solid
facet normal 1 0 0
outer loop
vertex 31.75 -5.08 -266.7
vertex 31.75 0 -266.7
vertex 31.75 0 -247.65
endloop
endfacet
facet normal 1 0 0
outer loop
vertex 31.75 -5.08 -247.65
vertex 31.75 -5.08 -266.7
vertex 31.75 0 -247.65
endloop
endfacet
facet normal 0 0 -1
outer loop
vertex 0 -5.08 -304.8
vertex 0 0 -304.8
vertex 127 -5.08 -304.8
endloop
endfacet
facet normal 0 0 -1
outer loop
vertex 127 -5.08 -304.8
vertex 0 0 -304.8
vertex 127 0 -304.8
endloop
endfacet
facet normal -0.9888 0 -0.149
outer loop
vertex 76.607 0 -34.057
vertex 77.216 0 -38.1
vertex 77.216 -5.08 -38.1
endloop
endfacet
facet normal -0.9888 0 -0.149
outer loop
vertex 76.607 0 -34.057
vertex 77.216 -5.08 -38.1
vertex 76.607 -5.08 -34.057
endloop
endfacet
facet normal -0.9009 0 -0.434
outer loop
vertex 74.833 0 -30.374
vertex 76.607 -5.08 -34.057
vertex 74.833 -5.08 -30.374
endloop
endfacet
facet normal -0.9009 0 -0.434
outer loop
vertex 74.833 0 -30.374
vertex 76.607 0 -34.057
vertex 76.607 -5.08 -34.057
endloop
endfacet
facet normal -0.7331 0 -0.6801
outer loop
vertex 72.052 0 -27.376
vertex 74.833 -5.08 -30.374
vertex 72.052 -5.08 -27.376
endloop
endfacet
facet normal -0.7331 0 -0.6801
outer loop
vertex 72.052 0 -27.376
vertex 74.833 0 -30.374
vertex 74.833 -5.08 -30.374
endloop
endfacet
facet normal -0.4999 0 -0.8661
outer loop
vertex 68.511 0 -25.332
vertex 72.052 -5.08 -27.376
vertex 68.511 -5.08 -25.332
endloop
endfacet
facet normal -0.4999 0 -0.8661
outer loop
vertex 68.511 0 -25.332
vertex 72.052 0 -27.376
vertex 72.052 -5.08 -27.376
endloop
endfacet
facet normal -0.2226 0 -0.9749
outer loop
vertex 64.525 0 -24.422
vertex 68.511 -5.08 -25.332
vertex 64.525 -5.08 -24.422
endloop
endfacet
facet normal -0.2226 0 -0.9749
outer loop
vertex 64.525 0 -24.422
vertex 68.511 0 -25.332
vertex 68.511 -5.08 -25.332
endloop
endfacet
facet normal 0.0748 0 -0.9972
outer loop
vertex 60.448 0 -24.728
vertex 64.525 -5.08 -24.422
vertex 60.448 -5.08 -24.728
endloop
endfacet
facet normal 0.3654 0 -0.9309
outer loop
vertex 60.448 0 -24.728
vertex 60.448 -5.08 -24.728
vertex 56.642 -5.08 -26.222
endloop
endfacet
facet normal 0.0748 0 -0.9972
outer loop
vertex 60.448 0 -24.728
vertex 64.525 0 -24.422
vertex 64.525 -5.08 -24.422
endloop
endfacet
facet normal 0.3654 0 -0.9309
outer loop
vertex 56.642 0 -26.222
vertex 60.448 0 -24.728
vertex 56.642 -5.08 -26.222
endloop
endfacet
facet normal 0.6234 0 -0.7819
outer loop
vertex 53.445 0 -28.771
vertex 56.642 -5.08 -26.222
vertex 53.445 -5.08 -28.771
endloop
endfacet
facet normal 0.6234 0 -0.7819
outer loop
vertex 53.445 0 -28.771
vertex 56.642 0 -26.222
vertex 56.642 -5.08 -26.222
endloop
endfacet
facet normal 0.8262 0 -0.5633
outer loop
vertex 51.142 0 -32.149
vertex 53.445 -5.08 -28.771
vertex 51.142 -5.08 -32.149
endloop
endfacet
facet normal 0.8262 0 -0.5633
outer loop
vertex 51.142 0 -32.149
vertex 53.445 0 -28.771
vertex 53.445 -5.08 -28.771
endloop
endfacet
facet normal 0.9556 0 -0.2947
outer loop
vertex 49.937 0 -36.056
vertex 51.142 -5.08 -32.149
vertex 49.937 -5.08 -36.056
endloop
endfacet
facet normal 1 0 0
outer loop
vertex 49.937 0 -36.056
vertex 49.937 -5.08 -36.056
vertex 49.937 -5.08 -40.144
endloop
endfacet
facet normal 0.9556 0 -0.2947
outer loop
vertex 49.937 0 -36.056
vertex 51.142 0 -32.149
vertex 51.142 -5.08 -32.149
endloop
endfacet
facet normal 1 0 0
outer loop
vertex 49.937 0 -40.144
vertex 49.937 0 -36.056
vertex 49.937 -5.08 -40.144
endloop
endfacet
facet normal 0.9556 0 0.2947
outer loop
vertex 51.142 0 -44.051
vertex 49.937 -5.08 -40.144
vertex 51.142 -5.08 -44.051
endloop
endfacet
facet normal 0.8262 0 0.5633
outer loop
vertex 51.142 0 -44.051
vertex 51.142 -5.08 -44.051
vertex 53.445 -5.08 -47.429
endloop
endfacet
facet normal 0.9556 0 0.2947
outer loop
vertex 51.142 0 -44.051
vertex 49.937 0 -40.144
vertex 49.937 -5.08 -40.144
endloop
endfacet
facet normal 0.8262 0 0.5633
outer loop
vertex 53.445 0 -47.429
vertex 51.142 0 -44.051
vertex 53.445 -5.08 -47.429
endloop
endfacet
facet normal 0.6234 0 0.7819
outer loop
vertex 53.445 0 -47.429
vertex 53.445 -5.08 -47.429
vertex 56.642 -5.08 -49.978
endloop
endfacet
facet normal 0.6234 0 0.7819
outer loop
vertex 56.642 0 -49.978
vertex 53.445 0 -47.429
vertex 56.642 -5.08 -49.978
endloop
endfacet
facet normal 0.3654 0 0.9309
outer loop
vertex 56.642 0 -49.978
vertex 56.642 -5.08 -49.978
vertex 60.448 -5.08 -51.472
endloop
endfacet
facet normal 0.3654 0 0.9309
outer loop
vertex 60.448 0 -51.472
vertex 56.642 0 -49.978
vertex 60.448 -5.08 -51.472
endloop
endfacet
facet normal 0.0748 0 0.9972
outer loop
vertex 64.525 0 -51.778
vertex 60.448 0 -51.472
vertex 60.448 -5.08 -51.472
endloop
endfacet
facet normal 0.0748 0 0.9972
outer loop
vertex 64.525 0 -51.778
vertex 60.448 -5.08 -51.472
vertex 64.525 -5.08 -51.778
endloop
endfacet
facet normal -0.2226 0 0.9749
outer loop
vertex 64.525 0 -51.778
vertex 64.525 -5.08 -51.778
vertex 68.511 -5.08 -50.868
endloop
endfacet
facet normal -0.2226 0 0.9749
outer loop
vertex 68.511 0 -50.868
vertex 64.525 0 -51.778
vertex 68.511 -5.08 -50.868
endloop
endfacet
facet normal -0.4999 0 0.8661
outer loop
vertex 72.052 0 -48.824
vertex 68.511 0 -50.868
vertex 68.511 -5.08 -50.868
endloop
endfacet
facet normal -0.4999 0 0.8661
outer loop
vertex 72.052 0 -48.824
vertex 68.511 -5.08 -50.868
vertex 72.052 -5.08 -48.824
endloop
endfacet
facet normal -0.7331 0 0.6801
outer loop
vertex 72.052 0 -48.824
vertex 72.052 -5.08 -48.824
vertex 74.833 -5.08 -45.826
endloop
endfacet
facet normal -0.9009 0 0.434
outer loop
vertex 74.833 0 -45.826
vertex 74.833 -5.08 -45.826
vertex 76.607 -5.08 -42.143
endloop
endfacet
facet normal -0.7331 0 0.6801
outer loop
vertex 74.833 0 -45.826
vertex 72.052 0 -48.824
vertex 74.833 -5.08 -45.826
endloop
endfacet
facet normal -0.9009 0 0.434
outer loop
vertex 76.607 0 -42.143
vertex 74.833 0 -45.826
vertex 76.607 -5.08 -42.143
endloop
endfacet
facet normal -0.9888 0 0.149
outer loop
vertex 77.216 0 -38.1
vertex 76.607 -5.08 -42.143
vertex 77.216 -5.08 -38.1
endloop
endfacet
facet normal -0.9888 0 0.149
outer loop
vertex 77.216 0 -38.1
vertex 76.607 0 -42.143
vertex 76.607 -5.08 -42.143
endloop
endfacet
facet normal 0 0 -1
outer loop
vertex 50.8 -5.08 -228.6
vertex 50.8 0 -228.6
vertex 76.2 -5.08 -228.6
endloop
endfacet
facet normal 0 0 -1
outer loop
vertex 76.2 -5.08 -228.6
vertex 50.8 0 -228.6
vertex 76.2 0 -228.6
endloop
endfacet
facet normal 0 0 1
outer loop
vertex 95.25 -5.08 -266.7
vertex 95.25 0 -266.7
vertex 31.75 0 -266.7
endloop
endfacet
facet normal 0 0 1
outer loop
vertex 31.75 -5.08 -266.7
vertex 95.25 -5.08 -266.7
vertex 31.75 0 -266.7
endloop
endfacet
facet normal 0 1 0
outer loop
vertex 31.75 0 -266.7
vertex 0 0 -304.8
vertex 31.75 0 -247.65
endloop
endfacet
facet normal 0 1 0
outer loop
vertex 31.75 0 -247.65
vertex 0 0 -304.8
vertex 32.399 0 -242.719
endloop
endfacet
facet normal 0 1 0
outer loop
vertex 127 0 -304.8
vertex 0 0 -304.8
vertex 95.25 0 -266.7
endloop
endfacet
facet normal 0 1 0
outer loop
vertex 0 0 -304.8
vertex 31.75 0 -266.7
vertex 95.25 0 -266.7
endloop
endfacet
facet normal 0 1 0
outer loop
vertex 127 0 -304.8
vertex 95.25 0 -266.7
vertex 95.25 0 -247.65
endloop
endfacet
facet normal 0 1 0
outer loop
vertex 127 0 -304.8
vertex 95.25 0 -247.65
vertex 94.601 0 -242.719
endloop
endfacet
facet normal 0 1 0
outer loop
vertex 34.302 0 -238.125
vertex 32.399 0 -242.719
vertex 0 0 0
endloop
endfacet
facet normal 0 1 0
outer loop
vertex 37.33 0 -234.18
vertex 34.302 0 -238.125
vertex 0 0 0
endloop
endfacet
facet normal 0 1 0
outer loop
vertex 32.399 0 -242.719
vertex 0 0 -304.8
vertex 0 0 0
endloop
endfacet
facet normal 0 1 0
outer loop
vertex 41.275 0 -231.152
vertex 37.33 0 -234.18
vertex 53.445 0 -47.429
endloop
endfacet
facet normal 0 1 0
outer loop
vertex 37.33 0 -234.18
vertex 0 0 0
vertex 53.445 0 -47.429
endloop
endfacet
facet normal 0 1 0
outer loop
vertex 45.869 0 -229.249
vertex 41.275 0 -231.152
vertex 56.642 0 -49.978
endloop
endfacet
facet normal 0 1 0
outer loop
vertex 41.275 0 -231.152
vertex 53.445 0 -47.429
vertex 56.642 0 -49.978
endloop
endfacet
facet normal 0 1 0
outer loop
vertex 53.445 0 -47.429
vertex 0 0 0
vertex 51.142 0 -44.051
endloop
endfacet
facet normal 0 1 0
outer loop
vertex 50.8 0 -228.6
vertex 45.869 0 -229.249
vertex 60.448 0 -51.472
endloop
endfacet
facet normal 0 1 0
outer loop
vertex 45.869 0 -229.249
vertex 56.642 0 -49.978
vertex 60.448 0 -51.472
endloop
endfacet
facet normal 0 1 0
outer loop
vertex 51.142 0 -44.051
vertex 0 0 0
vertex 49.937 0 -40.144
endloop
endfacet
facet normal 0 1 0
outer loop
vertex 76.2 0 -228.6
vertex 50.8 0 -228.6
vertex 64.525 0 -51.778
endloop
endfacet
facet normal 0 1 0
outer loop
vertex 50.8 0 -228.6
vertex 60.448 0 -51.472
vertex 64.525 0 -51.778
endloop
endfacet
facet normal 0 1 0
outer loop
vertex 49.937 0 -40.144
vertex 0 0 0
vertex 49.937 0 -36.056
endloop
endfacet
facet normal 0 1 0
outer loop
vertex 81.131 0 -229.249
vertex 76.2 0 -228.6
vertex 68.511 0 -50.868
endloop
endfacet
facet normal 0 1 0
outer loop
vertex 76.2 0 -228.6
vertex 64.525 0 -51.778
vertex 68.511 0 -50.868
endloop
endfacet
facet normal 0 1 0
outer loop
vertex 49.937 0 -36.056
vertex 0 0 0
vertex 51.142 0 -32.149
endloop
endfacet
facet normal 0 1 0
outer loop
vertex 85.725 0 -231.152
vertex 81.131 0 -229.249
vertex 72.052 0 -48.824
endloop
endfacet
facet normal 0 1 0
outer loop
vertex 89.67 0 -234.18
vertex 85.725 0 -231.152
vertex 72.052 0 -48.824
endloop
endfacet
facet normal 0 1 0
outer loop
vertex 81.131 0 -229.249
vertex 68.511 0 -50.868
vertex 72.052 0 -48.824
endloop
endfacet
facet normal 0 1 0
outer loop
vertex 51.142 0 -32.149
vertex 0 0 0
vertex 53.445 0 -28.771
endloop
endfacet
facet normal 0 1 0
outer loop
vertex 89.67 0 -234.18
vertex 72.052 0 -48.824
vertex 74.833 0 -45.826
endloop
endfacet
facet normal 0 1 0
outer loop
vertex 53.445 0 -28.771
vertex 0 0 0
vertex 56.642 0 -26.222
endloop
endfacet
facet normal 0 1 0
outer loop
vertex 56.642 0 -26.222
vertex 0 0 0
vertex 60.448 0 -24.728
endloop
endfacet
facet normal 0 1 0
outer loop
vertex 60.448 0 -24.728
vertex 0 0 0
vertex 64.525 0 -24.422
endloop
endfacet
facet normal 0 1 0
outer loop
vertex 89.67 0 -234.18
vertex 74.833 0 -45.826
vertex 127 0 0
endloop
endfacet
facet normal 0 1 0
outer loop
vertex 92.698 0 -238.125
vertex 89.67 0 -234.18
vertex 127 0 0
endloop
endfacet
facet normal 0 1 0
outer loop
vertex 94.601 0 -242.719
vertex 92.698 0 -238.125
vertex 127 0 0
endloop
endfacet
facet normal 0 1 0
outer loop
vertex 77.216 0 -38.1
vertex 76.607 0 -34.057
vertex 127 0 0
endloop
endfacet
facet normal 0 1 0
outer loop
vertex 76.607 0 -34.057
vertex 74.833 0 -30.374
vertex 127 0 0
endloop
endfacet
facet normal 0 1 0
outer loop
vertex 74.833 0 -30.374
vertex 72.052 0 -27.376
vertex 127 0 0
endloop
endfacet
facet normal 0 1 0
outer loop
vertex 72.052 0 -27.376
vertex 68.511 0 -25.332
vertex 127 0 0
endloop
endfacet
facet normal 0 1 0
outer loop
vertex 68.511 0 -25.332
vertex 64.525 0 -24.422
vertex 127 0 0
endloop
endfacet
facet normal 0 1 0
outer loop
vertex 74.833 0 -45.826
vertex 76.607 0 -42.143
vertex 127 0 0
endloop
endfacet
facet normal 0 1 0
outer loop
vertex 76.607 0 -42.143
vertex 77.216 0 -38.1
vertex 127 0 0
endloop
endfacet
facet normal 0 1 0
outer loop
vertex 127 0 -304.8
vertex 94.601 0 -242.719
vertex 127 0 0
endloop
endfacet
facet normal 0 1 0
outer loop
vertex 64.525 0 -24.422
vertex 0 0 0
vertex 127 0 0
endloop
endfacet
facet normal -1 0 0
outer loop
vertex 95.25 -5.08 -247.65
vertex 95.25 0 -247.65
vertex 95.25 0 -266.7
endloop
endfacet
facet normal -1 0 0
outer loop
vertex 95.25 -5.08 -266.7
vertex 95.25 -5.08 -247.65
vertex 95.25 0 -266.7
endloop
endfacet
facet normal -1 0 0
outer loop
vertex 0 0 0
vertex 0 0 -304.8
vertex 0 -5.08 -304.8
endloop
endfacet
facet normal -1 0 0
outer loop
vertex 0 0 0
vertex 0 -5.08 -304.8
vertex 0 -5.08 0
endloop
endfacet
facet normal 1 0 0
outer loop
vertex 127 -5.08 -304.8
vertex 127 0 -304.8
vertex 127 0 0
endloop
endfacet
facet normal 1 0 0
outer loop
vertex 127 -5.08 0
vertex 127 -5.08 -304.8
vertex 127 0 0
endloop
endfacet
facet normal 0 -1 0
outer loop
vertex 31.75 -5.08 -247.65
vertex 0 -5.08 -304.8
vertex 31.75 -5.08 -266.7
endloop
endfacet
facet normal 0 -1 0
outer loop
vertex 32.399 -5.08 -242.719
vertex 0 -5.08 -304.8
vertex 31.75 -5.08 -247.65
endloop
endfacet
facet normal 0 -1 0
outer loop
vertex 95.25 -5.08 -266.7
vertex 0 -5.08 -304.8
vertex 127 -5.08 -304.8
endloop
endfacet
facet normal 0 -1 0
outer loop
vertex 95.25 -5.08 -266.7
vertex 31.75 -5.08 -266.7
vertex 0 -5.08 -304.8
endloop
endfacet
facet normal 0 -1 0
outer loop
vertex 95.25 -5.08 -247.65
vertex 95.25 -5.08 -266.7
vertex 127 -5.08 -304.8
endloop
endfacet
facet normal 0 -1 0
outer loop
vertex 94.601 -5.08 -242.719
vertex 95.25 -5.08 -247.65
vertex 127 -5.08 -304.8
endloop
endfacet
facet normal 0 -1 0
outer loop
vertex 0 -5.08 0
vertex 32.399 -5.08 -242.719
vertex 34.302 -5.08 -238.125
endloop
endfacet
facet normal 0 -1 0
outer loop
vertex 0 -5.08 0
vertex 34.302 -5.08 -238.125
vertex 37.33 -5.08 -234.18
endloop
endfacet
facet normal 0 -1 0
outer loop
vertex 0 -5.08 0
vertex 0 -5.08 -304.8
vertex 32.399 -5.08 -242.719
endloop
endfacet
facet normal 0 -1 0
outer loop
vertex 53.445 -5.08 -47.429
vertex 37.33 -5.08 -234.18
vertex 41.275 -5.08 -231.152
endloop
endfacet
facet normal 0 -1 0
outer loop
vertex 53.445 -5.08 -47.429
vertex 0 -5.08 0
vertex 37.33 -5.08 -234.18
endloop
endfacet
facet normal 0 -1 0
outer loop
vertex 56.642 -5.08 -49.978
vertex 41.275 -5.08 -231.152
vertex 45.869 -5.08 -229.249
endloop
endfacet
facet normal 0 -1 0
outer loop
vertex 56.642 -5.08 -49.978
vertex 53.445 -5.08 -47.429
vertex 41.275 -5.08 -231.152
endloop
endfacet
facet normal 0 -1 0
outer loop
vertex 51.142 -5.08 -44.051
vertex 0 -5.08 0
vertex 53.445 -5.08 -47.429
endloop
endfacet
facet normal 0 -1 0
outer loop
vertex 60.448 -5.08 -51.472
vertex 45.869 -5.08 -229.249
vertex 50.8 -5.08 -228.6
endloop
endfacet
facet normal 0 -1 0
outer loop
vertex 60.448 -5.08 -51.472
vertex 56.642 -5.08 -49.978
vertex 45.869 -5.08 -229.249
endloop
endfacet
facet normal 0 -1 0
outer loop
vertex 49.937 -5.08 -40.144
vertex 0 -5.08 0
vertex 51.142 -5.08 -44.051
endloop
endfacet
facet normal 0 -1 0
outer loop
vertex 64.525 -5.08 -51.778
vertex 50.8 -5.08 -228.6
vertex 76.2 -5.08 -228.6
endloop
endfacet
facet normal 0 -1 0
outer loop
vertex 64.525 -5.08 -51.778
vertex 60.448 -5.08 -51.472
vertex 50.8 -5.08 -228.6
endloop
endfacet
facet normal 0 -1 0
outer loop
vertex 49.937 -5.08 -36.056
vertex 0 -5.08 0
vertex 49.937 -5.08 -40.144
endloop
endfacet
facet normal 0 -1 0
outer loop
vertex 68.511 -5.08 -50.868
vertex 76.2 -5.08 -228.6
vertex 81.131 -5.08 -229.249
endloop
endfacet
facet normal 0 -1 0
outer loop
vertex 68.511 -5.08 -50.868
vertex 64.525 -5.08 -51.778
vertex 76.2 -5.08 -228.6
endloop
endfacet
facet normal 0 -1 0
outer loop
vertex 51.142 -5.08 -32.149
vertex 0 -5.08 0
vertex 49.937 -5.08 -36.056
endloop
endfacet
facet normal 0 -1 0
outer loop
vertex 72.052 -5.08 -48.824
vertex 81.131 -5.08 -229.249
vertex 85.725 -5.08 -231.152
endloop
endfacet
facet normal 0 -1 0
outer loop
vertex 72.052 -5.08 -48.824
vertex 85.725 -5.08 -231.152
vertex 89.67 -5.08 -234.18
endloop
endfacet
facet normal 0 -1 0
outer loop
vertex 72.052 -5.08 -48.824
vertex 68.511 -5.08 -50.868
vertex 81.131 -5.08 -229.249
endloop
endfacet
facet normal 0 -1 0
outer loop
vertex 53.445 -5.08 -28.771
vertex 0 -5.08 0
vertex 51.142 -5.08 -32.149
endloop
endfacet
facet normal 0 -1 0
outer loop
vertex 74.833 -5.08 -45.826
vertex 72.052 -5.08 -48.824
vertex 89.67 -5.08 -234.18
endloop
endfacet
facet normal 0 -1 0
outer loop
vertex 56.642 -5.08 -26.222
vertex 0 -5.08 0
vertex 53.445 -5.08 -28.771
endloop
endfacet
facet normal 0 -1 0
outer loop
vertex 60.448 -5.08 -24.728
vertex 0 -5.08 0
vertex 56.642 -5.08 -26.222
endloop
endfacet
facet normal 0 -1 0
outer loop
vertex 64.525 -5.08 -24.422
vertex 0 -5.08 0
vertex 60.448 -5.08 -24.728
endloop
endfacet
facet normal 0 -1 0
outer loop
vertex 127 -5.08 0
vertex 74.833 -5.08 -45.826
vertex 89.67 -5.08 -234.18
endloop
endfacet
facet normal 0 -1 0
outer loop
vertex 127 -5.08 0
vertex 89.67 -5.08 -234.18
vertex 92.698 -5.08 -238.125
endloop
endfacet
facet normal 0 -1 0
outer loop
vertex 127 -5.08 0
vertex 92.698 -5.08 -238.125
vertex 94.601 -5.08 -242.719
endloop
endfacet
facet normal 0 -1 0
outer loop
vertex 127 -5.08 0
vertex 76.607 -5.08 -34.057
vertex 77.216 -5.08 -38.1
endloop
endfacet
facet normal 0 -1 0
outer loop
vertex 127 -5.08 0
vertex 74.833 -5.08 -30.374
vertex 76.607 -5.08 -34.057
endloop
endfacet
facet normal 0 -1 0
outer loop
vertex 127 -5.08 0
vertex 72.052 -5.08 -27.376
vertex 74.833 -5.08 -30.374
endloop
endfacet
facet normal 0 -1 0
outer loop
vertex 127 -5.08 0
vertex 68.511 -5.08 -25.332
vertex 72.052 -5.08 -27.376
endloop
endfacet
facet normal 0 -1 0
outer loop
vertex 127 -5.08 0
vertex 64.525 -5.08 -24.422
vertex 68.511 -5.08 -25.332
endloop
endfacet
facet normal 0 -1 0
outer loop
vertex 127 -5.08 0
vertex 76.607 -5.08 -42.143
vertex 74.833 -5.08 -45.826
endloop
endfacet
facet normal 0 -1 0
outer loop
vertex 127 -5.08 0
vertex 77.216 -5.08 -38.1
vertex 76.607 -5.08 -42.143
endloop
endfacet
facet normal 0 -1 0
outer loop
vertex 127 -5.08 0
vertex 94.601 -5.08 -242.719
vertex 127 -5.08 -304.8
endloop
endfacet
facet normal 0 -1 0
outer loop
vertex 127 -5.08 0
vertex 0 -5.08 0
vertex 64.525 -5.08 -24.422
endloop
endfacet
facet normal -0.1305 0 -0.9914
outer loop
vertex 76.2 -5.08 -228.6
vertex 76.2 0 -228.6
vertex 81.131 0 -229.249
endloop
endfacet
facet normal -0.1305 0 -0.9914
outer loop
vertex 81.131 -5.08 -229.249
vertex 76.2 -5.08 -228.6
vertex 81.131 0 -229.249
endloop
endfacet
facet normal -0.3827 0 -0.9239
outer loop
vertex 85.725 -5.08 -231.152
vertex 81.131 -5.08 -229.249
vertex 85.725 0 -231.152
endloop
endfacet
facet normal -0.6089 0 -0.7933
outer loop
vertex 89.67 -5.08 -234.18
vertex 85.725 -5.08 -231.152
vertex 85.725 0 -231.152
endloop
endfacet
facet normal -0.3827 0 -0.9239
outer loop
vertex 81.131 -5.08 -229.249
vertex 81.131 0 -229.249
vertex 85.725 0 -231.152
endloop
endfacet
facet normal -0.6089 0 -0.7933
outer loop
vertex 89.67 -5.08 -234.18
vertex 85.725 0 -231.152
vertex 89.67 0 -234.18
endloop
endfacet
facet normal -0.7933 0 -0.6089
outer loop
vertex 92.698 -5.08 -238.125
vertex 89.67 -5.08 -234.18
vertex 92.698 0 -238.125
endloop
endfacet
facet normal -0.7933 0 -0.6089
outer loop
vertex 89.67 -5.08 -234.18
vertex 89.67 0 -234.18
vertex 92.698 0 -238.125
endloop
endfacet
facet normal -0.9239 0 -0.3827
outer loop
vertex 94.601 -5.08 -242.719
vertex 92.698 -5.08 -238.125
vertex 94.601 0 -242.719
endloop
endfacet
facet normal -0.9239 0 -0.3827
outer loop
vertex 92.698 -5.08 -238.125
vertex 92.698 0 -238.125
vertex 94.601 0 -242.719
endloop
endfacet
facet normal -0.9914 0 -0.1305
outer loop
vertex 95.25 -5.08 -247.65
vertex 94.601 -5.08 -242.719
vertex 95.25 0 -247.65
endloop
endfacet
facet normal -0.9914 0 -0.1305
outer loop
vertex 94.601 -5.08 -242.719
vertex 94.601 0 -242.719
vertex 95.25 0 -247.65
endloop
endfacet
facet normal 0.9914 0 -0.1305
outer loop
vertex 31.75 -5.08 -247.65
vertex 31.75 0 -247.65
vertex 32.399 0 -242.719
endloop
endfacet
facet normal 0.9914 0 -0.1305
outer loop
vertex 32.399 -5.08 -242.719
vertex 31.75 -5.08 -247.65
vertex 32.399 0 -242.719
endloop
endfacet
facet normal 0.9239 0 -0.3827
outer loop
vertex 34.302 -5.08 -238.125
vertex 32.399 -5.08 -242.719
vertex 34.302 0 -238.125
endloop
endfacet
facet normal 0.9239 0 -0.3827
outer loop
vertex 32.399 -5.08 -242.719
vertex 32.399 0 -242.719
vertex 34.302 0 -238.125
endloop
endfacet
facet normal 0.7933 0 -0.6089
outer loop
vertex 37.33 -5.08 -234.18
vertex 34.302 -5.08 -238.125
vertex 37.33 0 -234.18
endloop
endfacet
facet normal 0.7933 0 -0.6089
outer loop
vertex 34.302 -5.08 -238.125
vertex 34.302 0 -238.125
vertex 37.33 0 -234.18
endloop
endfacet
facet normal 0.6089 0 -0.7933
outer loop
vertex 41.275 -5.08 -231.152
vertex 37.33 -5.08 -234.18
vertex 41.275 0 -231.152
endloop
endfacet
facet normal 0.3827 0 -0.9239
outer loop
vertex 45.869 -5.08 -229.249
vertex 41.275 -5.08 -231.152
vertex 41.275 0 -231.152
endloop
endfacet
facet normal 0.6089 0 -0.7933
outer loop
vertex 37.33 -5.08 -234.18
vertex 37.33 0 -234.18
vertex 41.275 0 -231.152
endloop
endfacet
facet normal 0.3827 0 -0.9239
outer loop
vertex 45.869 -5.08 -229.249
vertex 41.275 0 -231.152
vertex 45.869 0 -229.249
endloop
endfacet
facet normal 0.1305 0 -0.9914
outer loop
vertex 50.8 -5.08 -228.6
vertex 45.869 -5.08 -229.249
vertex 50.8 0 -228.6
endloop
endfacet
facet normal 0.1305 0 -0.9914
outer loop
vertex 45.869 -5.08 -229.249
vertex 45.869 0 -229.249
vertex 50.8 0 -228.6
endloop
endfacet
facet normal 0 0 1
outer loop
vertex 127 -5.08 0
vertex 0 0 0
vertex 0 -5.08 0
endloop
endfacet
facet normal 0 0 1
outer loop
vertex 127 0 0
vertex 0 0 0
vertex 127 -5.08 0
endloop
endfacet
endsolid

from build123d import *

# Parameters (mm, degrees)
F0_W     = 127
F0_H     = 304.8
F0_R     = 13.716
F1_DEPTH = 5.08


with BuildPart() as f1:
    # F0 (on Front) → F1 (new body)
    with BuildSketch(Plane.XZ):
        with Locations((63.5, -152.4)):
            Rectangle(F0_W, F0_H)
        with BuildLine():
            Line((95.25, -266.7), (31.75, -266.7))
            Line((31.75, -266.7), (31.75, -247.65))
            ThreePointArc((31.75, -247.65), (37.329616, -234.179616), (50.8, -228.6))
            Line((50.8, -228.6), (76.2, -228.6))
            ThreePointArc((76.2, -228.6), (89.670384, -234.179616), (95.25, -247.65))
            Line((95.25, -247.65), (95.25, -266.7))
        make_face(mode=Mode.SUBTRACT)
        with Locations((63.5, -38.1)):
            Circle(F0_R, mode=Mode.SUBTRACT)
    extrude(amount=F1_DEPTH)


solid = f1.part
